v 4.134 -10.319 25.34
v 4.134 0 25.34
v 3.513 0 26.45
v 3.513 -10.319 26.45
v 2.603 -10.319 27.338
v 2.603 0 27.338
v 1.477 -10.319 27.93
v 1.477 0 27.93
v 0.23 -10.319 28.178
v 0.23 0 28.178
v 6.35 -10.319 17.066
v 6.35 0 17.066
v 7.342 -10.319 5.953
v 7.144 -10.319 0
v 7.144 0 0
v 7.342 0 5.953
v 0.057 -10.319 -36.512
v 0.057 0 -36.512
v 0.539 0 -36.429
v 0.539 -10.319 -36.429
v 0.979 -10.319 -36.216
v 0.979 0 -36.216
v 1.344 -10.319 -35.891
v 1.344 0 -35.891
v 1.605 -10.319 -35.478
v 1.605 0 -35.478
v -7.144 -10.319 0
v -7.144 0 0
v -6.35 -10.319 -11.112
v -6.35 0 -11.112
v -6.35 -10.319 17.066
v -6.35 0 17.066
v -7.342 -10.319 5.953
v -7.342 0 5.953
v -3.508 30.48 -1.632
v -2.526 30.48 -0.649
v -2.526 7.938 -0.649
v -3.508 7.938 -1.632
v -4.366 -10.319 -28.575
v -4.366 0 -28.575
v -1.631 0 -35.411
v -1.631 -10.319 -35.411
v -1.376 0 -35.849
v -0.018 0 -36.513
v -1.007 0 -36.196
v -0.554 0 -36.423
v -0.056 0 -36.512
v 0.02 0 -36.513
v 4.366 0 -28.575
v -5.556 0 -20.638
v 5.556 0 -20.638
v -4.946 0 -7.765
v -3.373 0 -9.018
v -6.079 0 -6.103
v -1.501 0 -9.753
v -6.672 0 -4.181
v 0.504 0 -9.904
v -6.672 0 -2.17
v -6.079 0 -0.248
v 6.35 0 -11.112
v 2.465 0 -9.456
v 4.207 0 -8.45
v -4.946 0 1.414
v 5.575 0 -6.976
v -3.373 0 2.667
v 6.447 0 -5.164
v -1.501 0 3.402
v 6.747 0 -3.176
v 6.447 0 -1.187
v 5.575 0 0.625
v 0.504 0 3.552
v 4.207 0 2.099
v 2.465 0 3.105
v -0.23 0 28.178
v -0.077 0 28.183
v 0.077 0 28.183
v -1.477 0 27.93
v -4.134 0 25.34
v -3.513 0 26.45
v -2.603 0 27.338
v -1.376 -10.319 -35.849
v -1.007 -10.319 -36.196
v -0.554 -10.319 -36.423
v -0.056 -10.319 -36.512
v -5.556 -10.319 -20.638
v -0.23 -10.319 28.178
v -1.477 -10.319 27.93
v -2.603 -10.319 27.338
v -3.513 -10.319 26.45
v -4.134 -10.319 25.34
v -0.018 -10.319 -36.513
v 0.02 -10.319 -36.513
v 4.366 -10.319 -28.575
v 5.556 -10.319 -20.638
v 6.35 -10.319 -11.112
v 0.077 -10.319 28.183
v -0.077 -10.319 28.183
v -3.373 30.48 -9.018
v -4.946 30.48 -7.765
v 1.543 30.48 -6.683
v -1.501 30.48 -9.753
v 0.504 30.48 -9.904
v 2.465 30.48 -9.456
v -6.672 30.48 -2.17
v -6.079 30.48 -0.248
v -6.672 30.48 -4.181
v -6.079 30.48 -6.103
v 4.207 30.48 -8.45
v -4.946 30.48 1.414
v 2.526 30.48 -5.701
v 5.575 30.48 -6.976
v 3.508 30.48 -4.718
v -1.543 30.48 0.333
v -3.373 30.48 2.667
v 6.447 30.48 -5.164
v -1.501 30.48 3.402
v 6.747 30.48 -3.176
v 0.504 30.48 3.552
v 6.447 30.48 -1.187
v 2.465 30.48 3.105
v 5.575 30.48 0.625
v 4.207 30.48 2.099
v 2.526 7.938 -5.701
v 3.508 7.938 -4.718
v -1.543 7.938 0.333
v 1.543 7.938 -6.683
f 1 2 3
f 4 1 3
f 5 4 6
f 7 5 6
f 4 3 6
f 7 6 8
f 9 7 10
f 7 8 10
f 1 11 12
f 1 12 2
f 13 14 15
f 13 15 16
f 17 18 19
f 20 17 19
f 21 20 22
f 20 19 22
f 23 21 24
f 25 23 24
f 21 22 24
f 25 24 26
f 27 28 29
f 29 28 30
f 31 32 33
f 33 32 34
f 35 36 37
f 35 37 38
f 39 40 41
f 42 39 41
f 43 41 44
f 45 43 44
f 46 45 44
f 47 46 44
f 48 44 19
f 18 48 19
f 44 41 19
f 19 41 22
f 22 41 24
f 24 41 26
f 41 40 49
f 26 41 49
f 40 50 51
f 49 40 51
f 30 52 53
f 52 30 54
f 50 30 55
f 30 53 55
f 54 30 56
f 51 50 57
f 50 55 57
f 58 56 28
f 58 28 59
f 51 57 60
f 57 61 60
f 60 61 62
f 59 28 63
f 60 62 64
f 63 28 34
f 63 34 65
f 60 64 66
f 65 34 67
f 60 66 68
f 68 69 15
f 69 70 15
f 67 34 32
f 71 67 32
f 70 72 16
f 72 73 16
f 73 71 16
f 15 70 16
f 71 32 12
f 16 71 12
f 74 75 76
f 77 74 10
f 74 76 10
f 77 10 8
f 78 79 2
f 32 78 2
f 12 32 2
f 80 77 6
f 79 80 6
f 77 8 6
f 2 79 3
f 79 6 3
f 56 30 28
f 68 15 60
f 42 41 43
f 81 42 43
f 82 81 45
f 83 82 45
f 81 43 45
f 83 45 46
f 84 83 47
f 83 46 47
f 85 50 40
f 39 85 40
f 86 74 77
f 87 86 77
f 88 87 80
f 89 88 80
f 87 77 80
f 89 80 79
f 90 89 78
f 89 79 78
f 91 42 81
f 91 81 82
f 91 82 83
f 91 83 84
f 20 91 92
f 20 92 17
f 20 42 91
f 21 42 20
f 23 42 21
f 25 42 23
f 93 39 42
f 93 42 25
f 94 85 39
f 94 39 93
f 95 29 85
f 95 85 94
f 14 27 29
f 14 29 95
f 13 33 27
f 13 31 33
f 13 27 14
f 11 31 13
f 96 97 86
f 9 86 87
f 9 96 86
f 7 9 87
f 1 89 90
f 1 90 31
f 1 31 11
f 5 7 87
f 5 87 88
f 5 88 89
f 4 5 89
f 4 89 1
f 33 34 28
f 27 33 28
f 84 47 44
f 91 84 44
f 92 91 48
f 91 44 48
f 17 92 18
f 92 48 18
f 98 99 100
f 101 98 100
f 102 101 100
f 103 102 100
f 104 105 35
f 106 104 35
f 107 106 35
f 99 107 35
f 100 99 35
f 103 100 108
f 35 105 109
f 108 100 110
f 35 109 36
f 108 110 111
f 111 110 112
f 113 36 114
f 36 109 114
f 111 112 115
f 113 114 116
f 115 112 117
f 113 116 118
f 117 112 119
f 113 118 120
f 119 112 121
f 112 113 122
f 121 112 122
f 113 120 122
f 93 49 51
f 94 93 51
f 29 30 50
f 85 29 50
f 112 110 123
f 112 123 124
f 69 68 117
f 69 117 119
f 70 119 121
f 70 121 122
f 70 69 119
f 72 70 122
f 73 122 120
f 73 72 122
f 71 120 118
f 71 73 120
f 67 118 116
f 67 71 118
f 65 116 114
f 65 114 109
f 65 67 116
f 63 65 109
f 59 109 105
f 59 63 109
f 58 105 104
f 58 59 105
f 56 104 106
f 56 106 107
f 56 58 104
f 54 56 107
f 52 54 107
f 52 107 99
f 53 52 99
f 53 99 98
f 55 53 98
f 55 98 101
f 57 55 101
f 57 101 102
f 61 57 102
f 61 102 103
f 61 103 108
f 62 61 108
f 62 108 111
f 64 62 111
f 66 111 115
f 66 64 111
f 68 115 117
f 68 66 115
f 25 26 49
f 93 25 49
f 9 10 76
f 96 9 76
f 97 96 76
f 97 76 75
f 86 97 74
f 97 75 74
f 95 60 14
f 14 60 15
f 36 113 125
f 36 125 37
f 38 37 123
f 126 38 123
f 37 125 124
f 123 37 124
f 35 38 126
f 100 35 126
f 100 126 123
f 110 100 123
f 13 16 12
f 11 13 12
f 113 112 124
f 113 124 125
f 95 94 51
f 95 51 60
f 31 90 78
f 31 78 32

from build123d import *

# Parameters (mm, degrees)
F4_DEPTH = 10.31875
F1_R     = 6.746875
F5_DEPTH = 30.48
F6_DEPTH = 35.3822
F7_DEPTH = 7.9375


with BuildPart() as f4:
    # F0 (on Front) → F4 (new body)
    with BuildSketch(Plane.XZ):
        with BuildLine():
            Line((-7.342188, 5.953125), (-7.14375, 0))
            Line((-7.14375, 0), (7.14375, 0))
            Line((7.14375, 0), (7.342187, 5.953125))
            Line((7.342187, 5.953125), (6.35, 17.065625))
            Line((6.35, 17.065625), (4.13357, 25.340298))
            ThreePointArc((4.13357, 25.340298), (2.602599, 27.338054), (0.23001, 28.178125))
            Line((0.23001, 28.178125), (-0.23001, 28.178125))
            ThreePointArc((-0.23001, 28.178125), (-2.602599, 27.338054), (-4.13357, 25.340298))
            Line((-4.13357, 25.340298), (-6.35, 17.065625))
            Line((-6.35, 17.065625), (-7.342188, 5.953125))
        make_face()
        with BuildLine():
            Line((7.14375, 0), (-7.14375, 0))
            Line((-7.14375, 0), (-6.35, -11.1125))
            Line((-6.35, -11.1125), (-5.55625, -20.6375))
            Line((-5.55625, -20.6375), (-4.365625, -28.575))
            Line((-4.365625, -28.575), (-1.63132, -35.410762))
            ThreePointArc((-1.63132, -35.410762), (-1.007245, -36.195929), (-0.055542, -36.5125))
            Line((-0.055542, -36.5125), (0.057313, -36.5125))
            ThreePointArc((0.057313, -36.5125), (0.979065, -36.216412), (1.604621, -35.477511))
            Line((1.604621, -35.477511), (4.365625, -28.575))
            Line((4.365625, -28.575), (5.55625, -20.6375))
            Line((5.55625, -20.6375), (6.35, -11.1125))
            Line((6.35, -11.1125), (7.14375, 0))
        make_face()
        with BuildLine():
            ThreePointArc((0.23001, 28.178125), (0, 28.184106), (-0.23001, 28.178125))
            Line((-0.23001, 28.178125), (0.23001, 28.178125))
        make_face()
        with BuildLine():
            Line((0.057313, -36.5125), (-0.055542, -36.5125))
            ThreePointArc((-0.055542, -36.5125), (0.000885, -36.513405), (0.057313, -36.5125))
        make_face()
    extrude(amount=F4_DEPTH)

    # F1 (on Front) → F5 (join)
    with BuildSketch(Plane.XZ):
        with Locations((0, -3.175531)):
            Circle(F1_R)
    extrude(amount=-F5_DEPTH)

    # F2 (on Front) → F6 (cut)
    with BuildSketch(Plane.XZ):
        Polygon((-1.543482, 0.332913), (-2.525697, -0.649303), (-3.507913, -1.631518), (1.543482, -6.682913), (2.525697, -5.700697), (3.507913, -4.718482), align=None)
    extrude(amount=-F6_DEPTH, mode=Mode.SUBTRACT)

    # F3 (on Front) → F7 (join)
    with BuildSketch(Plane.XZ):
        Polygon((-1.543482, 0.332913), (-2.525697, -0.649303), (-3.507913, -1.631518), (1.543482, -6.682913), (2.525697, -5.700697), (3.507913, -4.718482), align=None)
    extrude(amount=-F7_DEPTH)


solid = f4.part
